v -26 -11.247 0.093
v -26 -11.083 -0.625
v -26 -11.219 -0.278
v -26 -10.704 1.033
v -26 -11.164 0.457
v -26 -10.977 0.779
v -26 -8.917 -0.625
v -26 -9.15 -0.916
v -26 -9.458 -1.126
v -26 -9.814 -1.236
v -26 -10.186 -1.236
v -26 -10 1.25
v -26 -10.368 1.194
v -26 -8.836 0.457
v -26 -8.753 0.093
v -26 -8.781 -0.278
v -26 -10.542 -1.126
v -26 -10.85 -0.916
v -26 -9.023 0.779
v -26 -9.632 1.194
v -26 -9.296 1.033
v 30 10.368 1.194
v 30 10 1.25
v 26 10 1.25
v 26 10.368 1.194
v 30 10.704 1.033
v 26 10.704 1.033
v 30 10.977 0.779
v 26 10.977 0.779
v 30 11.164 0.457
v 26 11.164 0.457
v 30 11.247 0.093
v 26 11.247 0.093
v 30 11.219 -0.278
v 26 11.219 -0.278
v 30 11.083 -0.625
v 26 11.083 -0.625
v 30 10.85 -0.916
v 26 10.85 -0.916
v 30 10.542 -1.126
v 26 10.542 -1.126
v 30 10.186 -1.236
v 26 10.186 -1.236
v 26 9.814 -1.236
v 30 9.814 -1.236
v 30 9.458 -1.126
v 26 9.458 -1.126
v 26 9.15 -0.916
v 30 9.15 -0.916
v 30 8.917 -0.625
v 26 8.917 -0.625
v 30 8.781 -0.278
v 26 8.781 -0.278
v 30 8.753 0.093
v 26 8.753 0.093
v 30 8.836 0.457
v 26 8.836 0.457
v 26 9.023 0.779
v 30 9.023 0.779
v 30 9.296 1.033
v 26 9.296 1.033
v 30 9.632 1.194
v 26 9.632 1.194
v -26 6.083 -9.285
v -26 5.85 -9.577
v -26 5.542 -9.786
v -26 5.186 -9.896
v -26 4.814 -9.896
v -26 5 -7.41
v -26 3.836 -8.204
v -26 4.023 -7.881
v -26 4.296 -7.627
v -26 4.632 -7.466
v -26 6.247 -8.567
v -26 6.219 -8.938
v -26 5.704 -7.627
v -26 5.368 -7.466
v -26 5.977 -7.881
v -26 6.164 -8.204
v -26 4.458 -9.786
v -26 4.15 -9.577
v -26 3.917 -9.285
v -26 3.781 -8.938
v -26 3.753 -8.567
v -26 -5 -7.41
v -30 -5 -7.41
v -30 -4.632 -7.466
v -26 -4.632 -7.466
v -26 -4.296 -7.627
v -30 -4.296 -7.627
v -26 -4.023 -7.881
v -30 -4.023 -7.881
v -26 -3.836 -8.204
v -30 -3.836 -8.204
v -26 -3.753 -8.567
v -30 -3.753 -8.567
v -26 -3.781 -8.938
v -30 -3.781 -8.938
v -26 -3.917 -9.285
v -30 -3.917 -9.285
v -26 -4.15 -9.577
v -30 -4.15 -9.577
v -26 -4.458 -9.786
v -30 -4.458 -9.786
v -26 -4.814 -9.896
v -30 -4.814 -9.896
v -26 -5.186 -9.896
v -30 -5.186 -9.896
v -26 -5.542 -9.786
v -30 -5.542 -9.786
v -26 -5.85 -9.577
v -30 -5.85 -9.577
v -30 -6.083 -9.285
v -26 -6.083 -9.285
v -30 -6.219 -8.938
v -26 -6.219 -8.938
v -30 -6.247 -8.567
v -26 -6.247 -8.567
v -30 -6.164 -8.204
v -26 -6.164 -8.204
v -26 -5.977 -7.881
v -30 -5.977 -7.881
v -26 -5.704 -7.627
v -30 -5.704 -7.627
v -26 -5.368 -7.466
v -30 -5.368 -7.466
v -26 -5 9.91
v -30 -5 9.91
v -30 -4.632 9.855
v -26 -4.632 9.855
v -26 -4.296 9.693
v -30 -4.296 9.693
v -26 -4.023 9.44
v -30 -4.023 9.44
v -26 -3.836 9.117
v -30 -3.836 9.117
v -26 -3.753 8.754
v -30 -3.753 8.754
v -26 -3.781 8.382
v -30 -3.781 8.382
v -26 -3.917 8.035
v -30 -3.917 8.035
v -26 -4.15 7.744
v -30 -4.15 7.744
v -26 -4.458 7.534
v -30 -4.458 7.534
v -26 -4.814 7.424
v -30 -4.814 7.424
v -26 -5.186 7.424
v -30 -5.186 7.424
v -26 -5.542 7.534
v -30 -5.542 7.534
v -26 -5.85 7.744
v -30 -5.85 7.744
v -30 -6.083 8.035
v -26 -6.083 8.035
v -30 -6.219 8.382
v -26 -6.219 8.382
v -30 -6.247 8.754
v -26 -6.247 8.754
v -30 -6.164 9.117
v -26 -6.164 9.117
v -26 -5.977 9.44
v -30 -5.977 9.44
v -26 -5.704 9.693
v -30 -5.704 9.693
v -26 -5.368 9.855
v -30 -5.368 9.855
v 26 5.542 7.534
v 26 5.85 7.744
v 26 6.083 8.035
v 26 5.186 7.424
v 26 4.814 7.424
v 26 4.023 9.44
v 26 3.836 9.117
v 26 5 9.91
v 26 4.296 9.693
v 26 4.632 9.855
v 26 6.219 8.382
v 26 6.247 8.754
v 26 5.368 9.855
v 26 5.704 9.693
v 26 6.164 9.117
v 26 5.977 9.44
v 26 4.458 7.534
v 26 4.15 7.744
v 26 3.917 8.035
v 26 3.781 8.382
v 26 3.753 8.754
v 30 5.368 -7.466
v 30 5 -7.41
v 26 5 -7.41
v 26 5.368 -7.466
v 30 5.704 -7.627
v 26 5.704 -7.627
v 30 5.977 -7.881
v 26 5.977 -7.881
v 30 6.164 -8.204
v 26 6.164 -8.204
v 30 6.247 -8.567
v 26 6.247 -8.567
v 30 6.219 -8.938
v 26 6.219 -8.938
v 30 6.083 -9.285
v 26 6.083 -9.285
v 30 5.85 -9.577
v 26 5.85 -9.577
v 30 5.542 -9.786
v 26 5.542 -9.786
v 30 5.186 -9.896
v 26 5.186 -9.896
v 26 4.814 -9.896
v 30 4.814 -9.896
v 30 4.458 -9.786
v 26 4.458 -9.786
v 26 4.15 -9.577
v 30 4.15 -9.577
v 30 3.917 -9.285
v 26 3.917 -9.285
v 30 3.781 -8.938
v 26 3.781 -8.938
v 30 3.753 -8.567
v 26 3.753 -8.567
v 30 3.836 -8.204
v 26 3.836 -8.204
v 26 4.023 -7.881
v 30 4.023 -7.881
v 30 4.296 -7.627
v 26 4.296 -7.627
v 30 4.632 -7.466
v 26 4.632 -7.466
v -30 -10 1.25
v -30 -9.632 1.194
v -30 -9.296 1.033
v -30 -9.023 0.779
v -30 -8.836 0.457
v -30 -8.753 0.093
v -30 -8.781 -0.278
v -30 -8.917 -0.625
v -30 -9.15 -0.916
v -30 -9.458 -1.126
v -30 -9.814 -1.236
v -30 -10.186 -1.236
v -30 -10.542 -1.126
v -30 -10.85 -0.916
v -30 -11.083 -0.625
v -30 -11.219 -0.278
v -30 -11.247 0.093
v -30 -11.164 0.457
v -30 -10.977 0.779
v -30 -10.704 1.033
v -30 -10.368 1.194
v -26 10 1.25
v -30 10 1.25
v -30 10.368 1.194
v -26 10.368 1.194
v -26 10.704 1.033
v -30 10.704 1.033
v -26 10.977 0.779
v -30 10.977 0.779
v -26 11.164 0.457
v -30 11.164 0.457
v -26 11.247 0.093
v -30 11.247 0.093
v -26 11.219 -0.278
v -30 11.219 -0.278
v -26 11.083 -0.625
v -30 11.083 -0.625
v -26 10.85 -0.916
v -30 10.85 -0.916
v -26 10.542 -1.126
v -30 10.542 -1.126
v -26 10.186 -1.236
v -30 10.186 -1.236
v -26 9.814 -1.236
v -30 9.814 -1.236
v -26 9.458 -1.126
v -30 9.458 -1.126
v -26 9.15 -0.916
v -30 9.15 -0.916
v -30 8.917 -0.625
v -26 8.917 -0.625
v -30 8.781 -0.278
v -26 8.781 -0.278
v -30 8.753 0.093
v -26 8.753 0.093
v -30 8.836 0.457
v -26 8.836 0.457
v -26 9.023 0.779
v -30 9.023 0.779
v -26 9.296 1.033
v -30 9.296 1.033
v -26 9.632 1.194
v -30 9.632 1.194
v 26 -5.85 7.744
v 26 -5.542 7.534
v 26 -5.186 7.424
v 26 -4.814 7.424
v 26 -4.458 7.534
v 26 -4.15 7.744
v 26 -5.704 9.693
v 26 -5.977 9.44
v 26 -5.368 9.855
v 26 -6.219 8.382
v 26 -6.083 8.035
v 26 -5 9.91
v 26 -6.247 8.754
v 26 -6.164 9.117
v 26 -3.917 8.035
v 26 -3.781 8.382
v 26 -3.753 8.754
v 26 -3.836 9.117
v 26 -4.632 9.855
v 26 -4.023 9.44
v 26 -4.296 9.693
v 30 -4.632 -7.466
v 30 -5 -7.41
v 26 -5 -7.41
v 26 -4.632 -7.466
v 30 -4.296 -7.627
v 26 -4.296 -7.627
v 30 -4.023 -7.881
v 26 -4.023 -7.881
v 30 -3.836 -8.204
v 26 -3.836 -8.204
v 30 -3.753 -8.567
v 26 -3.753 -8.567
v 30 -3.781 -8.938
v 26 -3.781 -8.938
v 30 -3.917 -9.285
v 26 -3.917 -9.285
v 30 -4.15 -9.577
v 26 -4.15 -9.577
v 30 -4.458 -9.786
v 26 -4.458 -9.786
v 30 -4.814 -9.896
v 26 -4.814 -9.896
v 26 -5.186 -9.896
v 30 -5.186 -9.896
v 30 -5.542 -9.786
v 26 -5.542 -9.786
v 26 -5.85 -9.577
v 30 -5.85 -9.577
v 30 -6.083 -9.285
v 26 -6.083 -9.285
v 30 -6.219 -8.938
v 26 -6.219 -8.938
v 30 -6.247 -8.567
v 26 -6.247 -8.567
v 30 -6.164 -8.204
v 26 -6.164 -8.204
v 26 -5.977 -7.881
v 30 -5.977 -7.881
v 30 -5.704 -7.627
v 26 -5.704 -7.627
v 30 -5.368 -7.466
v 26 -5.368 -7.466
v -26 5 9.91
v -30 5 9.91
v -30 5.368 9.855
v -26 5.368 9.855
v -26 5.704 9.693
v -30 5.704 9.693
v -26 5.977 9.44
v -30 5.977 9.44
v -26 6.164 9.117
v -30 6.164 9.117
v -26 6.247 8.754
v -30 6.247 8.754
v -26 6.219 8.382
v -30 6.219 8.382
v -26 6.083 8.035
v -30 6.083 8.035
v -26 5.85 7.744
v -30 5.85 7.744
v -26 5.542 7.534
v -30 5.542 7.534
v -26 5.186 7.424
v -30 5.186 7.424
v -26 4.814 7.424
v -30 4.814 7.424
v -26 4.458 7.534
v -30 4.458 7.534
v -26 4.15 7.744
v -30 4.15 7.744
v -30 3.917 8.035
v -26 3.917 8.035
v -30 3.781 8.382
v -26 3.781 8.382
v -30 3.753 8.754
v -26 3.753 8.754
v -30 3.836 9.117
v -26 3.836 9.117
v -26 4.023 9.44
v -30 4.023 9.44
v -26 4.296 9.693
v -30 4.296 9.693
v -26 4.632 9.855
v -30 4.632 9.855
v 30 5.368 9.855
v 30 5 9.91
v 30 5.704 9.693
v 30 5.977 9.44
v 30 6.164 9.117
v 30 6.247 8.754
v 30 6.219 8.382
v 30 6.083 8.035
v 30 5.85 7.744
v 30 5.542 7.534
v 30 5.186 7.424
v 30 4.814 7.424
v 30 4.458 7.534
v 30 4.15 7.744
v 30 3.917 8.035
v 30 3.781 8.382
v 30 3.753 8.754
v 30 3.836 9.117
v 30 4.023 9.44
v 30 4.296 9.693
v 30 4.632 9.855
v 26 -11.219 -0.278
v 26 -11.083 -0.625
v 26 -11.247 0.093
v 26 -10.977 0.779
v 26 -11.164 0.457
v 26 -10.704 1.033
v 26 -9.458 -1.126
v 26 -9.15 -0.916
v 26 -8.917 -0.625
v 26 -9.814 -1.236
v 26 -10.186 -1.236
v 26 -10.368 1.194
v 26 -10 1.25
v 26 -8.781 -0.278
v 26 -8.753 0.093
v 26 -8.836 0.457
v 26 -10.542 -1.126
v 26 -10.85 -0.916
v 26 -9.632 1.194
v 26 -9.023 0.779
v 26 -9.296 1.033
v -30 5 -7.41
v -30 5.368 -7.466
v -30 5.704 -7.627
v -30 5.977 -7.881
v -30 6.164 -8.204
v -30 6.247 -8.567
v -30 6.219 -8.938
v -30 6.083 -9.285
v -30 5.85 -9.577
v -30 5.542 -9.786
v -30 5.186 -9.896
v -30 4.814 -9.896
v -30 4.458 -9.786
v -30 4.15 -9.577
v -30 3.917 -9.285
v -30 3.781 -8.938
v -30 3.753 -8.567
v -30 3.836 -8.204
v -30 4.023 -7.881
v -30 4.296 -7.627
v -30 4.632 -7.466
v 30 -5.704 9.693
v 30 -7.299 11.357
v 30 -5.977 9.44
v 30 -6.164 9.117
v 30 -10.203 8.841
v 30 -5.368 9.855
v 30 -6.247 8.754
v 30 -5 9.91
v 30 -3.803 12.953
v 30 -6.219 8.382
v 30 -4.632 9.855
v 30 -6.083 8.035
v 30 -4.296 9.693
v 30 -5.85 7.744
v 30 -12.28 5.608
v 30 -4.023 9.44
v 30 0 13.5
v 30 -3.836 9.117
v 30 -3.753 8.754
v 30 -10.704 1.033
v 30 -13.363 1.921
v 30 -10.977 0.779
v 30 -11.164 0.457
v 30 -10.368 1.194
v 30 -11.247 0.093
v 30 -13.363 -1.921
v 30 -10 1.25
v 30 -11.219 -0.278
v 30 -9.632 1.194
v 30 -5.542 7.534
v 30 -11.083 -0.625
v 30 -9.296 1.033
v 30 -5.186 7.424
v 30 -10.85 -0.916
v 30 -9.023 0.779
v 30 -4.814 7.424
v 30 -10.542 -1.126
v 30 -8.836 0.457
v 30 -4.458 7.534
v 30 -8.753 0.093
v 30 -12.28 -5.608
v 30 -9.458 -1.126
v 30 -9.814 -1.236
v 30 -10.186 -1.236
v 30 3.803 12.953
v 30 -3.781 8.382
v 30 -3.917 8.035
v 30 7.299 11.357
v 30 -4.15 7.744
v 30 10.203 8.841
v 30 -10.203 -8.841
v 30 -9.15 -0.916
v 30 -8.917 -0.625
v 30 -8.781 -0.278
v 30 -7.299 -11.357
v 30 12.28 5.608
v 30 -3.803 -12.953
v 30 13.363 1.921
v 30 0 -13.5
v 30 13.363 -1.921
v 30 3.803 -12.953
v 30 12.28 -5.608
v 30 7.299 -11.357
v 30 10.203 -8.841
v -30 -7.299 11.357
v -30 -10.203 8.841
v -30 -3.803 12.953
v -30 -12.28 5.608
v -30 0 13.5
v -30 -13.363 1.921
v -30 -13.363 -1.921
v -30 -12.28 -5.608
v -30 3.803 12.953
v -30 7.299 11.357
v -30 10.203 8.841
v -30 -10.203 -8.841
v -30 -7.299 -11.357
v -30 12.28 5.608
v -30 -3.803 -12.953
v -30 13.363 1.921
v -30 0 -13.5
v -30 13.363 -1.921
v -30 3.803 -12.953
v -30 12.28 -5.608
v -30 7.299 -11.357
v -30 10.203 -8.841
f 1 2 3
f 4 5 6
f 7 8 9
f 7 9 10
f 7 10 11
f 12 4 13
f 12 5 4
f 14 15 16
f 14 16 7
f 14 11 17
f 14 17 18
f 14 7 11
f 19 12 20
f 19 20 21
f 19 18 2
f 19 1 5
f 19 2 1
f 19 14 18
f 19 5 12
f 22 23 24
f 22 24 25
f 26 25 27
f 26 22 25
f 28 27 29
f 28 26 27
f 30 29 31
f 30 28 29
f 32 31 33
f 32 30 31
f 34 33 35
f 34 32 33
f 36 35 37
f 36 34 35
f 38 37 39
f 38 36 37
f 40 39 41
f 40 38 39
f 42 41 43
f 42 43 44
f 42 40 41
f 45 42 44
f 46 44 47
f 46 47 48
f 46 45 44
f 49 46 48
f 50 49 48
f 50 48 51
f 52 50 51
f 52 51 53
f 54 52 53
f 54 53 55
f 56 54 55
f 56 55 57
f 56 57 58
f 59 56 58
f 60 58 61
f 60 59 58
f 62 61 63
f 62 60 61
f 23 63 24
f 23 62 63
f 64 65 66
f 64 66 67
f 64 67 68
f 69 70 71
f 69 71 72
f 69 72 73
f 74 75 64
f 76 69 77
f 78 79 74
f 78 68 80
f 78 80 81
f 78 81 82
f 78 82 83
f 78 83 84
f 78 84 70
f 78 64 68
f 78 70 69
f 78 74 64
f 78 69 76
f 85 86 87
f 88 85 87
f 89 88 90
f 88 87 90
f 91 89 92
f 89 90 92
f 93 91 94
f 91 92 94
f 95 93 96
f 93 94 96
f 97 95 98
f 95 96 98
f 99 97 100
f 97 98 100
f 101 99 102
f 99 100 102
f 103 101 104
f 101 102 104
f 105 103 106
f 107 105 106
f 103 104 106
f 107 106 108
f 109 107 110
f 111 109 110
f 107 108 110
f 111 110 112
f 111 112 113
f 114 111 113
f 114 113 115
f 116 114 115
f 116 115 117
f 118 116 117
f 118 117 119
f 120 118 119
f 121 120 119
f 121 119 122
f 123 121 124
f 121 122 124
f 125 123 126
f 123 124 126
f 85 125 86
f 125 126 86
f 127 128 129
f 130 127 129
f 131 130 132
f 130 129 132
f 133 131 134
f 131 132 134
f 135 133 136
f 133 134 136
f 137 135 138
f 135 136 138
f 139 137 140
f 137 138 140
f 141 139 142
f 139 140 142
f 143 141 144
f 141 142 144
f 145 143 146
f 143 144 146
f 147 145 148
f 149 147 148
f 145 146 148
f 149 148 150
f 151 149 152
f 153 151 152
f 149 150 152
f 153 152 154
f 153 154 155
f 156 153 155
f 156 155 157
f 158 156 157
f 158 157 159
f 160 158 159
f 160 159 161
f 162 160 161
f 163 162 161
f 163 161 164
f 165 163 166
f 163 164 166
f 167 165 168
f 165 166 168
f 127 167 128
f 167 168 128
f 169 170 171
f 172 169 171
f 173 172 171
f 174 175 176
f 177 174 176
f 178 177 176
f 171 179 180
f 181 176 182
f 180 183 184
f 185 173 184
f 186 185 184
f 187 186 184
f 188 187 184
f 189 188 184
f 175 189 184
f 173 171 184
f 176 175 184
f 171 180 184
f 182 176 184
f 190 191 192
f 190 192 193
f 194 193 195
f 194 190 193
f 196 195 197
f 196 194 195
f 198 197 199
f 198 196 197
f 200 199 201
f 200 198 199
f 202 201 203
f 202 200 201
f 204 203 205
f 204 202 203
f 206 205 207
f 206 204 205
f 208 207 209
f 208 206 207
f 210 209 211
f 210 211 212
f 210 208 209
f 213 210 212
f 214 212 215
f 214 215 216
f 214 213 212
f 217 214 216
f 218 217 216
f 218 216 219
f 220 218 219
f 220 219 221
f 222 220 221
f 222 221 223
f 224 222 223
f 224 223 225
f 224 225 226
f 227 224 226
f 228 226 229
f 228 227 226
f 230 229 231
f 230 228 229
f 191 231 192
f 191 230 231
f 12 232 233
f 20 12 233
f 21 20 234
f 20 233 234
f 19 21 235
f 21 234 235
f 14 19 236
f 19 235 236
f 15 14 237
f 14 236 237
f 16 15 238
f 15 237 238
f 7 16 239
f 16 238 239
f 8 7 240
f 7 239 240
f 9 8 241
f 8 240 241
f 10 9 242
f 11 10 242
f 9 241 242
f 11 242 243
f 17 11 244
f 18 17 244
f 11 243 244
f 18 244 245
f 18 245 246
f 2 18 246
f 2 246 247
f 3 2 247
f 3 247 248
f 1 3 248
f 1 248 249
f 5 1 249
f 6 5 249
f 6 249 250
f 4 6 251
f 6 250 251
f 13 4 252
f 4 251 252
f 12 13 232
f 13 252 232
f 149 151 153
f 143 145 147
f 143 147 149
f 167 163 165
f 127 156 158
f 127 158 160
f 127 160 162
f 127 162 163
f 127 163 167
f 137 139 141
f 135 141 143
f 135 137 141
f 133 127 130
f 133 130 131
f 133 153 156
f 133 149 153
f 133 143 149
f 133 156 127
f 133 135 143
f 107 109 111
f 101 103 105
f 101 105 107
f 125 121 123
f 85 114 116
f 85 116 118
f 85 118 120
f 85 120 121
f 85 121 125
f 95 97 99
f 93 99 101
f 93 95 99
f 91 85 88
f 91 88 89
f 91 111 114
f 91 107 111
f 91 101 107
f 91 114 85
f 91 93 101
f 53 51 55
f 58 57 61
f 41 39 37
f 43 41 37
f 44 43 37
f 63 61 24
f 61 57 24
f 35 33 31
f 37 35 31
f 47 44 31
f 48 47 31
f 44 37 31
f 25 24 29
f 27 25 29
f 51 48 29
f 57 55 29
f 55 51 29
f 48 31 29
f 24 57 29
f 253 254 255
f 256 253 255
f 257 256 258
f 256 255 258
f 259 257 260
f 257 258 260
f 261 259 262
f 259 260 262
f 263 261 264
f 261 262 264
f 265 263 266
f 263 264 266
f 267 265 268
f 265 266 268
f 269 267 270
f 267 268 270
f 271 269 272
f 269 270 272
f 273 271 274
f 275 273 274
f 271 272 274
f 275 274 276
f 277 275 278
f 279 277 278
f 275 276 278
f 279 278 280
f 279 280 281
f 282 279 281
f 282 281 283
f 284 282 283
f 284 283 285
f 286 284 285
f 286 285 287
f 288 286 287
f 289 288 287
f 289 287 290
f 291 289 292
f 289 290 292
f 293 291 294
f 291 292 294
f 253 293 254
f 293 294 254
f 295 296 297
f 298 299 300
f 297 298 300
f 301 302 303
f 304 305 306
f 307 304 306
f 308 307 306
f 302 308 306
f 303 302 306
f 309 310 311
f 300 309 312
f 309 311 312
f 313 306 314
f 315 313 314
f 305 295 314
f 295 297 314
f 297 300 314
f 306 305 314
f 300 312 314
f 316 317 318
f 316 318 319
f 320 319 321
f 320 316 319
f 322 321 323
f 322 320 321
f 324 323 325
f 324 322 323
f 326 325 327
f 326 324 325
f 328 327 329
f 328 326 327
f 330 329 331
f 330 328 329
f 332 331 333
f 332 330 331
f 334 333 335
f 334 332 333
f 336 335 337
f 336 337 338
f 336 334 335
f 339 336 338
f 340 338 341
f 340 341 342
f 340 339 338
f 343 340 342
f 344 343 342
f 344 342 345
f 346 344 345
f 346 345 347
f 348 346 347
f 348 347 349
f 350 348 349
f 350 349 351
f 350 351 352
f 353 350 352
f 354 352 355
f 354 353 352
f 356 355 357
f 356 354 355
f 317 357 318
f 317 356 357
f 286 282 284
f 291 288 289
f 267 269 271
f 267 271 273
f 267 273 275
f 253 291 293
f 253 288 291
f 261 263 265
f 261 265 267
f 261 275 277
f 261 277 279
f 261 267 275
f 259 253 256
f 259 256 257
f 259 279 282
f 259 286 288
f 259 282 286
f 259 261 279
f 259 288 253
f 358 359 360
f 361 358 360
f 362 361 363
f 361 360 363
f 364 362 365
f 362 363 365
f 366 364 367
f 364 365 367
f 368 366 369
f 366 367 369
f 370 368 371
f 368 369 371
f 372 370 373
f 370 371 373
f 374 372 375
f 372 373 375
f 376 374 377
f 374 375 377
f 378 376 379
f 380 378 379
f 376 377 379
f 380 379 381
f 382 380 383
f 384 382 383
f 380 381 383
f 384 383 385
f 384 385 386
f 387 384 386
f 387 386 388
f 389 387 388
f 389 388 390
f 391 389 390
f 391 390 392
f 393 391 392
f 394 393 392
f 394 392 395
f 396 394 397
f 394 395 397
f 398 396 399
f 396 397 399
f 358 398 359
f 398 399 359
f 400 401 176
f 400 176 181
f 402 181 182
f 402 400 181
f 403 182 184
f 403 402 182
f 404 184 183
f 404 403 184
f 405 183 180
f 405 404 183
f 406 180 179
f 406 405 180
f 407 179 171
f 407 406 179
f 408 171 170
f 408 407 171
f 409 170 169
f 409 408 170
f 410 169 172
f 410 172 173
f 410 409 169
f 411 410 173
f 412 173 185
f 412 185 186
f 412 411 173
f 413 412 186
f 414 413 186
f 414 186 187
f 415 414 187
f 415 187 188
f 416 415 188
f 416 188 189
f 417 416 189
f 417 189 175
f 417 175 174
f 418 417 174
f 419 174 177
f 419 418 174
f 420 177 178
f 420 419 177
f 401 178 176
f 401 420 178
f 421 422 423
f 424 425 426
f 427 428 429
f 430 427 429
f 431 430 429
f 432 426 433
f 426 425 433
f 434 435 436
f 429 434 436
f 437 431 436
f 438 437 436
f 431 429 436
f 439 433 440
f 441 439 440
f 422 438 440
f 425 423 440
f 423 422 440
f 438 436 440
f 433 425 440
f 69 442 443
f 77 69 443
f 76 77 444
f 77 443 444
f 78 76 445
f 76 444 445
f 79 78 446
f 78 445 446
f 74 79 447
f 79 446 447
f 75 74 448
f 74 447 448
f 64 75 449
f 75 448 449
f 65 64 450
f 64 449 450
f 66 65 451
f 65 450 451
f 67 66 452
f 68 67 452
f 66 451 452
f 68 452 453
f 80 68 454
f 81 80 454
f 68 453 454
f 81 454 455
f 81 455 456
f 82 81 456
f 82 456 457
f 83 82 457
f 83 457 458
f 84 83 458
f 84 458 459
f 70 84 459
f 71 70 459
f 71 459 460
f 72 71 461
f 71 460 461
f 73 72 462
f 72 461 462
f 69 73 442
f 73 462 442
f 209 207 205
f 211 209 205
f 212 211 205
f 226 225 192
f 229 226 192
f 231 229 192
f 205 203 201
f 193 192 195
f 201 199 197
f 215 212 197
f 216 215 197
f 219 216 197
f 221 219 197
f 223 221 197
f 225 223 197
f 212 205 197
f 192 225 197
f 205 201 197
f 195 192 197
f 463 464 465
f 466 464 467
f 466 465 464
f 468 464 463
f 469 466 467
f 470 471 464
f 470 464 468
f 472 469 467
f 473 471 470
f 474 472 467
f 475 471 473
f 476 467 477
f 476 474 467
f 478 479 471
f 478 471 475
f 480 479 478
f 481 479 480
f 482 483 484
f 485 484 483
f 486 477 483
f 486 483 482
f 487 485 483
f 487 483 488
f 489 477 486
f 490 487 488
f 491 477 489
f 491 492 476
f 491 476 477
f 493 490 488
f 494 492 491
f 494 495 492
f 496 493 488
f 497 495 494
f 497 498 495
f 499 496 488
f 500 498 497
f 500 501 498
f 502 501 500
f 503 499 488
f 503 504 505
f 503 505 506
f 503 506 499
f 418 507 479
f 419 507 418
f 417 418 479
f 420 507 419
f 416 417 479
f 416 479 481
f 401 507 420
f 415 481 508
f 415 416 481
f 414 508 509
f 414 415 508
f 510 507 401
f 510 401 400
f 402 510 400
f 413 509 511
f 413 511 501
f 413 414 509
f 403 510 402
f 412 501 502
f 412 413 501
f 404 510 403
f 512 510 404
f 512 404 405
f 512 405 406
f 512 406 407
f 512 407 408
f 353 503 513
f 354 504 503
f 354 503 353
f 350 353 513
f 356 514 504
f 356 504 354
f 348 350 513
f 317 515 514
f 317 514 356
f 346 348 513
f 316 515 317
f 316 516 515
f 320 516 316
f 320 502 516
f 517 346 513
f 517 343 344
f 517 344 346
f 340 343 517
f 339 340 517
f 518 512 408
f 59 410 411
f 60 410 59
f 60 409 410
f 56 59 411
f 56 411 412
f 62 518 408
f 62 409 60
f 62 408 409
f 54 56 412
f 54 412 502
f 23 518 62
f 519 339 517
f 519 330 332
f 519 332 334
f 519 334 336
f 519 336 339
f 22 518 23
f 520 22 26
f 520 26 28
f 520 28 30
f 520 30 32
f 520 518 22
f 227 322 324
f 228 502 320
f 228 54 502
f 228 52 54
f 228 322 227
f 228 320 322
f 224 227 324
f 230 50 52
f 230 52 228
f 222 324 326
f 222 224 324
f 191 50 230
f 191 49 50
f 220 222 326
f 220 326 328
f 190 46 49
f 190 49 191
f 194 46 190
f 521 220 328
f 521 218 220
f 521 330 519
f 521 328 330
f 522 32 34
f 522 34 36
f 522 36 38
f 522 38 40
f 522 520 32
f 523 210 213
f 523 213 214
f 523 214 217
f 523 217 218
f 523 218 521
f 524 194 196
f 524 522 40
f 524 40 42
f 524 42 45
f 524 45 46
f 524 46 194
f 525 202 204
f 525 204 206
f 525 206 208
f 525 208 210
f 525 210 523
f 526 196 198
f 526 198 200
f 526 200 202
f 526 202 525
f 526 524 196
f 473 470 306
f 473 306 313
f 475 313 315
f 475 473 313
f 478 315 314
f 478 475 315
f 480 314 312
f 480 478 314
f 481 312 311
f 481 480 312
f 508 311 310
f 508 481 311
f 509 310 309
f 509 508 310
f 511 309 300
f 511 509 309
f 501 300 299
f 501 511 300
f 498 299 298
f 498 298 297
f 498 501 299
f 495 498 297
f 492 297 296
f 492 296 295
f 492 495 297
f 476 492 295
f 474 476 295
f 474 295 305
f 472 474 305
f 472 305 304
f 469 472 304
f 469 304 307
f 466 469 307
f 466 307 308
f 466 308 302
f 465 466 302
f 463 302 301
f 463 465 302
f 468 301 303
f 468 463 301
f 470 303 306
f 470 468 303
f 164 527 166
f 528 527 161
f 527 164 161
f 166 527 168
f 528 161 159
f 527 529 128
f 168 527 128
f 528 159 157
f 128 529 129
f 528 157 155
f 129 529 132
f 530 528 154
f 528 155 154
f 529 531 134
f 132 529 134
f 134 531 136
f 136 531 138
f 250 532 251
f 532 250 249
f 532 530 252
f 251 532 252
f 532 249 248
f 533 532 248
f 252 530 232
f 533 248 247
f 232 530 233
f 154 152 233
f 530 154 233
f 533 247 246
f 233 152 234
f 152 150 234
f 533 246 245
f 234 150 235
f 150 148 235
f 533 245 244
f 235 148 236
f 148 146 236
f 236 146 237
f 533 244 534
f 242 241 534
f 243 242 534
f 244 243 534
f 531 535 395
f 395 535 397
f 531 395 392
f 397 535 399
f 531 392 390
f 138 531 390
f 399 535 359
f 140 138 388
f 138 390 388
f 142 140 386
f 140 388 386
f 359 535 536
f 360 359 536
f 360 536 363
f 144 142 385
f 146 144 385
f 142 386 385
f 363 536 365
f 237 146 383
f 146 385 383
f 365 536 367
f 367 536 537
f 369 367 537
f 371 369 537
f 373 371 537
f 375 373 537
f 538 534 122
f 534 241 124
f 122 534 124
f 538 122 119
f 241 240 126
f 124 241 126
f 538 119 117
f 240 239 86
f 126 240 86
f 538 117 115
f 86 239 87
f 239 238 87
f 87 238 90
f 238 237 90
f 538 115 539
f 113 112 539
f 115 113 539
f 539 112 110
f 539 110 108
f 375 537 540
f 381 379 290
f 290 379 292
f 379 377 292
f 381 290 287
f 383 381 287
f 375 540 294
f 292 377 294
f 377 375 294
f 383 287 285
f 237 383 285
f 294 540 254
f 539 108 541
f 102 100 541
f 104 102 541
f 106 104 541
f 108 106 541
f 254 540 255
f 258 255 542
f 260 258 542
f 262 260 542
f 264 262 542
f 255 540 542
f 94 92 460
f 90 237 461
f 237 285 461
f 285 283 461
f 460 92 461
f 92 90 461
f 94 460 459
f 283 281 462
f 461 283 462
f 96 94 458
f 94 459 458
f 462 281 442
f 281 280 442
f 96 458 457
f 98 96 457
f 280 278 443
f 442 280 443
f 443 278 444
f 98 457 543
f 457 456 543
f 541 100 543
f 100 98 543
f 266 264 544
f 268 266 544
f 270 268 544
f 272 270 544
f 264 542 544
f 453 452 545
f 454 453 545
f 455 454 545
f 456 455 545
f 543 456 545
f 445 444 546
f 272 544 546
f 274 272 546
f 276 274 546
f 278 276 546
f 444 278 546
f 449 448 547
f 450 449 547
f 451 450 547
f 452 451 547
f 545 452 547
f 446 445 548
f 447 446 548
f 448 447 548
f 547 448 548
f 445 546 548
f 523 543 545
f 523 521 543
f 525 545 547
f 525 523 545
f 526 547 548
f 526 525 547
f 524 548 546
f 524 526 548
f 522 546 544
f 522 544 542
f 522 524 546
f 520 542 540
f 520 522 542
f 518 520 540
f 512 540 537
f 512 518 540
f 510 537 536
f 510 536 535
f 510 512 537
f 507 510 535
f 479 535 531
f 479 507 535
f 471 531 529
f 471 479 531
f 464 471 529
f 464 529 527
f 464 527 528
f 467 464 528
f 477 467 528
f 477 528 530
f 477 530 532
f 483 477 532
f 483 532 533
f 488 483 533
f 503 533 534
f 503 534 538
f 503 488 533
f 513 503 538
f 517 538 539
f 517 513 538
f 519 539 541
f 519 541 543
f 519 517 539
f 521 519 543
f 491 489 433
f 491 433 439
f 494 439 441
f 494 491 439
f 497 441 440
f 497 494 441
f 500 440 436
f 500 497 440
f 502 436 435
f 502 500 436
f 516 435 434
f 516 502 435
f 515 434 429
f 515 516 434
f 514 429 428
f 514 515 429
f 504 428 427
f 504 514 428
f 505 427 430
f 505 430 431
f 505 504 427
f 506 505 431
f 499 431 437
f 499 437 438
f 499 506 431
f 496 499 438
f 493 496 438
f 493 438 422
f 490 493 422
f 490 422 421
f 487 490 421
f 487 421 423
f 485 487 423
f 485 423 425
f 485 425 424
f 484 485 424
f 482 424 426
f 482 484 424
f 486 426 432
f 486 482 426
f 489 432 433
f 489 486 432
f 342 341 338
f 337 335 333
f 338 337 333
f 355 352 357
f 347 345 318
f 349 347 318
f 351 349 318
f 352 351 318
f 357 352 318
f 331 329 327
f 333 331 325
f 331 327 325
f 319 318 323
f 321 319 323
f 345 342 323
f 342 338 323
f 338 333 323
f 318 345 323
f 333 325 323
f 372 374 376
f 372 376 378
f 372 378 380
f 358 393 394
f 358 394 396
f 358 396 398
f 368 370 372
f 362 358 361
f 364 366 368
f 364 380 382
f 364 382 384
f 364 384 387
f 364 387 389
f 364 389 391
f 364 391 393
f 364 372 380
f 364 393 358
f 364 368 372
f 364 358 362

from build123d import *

# Parameters (mm, degrees)
SKETCH1_R           = 13.5
BOSS_EXTRUDE1_DEPTH = 30
SKETCH2_R           = 1.25
CUT_EXTRUDE1_DEPTH  = 4


with BuildPart() as part:
    # Sketch1 → Boss-Extrude1 (new, symmetric)
    with BuildSketch(Plane(origin=(0, 0, 0), x_dir=(0, 0, -1), z_dir=(1, 0, 0))):
        Circle(SKETCH1_R)
    extrude(amount=BOSS_EXTRUDE1_DEPTH, both=True)

    # Sketch2 → Cut-Extrude1 (cut)
    with BuildSketch(Plane.ZY.offset(30)):
        with Locations((0, 10)):
            Circle(SKETCH2_R)
        with Locations((8.660254038, 5)):
            Circle(SKETCH2_R)
        with Locations((8.660254038, -5)):
            Circle(SKETCH2_R)
        with Locations((0, -10)):
            Circle(SKETCH2_R)
        with Locations((-8.660254038, -5)):
            Circle(SKETCH2_R)
        with Locations((-8.660254038, 5)):
            Circle(SKETCH2_R)
    cut_extrude1 = extrude(amount=-CUT_EXTRUDE1_DEPTH, mode=Mode.SUBTRACT)

    # Mirror1: Cut-Extrude1 across plane
    add(cut_extrude1.mirror(Plane(origin=(0, 0, 0), x_dir=(0, 0, 1), z_dir=(1, 0, 0))), mode=Mode.SUBTRACT)


solid = part.part
